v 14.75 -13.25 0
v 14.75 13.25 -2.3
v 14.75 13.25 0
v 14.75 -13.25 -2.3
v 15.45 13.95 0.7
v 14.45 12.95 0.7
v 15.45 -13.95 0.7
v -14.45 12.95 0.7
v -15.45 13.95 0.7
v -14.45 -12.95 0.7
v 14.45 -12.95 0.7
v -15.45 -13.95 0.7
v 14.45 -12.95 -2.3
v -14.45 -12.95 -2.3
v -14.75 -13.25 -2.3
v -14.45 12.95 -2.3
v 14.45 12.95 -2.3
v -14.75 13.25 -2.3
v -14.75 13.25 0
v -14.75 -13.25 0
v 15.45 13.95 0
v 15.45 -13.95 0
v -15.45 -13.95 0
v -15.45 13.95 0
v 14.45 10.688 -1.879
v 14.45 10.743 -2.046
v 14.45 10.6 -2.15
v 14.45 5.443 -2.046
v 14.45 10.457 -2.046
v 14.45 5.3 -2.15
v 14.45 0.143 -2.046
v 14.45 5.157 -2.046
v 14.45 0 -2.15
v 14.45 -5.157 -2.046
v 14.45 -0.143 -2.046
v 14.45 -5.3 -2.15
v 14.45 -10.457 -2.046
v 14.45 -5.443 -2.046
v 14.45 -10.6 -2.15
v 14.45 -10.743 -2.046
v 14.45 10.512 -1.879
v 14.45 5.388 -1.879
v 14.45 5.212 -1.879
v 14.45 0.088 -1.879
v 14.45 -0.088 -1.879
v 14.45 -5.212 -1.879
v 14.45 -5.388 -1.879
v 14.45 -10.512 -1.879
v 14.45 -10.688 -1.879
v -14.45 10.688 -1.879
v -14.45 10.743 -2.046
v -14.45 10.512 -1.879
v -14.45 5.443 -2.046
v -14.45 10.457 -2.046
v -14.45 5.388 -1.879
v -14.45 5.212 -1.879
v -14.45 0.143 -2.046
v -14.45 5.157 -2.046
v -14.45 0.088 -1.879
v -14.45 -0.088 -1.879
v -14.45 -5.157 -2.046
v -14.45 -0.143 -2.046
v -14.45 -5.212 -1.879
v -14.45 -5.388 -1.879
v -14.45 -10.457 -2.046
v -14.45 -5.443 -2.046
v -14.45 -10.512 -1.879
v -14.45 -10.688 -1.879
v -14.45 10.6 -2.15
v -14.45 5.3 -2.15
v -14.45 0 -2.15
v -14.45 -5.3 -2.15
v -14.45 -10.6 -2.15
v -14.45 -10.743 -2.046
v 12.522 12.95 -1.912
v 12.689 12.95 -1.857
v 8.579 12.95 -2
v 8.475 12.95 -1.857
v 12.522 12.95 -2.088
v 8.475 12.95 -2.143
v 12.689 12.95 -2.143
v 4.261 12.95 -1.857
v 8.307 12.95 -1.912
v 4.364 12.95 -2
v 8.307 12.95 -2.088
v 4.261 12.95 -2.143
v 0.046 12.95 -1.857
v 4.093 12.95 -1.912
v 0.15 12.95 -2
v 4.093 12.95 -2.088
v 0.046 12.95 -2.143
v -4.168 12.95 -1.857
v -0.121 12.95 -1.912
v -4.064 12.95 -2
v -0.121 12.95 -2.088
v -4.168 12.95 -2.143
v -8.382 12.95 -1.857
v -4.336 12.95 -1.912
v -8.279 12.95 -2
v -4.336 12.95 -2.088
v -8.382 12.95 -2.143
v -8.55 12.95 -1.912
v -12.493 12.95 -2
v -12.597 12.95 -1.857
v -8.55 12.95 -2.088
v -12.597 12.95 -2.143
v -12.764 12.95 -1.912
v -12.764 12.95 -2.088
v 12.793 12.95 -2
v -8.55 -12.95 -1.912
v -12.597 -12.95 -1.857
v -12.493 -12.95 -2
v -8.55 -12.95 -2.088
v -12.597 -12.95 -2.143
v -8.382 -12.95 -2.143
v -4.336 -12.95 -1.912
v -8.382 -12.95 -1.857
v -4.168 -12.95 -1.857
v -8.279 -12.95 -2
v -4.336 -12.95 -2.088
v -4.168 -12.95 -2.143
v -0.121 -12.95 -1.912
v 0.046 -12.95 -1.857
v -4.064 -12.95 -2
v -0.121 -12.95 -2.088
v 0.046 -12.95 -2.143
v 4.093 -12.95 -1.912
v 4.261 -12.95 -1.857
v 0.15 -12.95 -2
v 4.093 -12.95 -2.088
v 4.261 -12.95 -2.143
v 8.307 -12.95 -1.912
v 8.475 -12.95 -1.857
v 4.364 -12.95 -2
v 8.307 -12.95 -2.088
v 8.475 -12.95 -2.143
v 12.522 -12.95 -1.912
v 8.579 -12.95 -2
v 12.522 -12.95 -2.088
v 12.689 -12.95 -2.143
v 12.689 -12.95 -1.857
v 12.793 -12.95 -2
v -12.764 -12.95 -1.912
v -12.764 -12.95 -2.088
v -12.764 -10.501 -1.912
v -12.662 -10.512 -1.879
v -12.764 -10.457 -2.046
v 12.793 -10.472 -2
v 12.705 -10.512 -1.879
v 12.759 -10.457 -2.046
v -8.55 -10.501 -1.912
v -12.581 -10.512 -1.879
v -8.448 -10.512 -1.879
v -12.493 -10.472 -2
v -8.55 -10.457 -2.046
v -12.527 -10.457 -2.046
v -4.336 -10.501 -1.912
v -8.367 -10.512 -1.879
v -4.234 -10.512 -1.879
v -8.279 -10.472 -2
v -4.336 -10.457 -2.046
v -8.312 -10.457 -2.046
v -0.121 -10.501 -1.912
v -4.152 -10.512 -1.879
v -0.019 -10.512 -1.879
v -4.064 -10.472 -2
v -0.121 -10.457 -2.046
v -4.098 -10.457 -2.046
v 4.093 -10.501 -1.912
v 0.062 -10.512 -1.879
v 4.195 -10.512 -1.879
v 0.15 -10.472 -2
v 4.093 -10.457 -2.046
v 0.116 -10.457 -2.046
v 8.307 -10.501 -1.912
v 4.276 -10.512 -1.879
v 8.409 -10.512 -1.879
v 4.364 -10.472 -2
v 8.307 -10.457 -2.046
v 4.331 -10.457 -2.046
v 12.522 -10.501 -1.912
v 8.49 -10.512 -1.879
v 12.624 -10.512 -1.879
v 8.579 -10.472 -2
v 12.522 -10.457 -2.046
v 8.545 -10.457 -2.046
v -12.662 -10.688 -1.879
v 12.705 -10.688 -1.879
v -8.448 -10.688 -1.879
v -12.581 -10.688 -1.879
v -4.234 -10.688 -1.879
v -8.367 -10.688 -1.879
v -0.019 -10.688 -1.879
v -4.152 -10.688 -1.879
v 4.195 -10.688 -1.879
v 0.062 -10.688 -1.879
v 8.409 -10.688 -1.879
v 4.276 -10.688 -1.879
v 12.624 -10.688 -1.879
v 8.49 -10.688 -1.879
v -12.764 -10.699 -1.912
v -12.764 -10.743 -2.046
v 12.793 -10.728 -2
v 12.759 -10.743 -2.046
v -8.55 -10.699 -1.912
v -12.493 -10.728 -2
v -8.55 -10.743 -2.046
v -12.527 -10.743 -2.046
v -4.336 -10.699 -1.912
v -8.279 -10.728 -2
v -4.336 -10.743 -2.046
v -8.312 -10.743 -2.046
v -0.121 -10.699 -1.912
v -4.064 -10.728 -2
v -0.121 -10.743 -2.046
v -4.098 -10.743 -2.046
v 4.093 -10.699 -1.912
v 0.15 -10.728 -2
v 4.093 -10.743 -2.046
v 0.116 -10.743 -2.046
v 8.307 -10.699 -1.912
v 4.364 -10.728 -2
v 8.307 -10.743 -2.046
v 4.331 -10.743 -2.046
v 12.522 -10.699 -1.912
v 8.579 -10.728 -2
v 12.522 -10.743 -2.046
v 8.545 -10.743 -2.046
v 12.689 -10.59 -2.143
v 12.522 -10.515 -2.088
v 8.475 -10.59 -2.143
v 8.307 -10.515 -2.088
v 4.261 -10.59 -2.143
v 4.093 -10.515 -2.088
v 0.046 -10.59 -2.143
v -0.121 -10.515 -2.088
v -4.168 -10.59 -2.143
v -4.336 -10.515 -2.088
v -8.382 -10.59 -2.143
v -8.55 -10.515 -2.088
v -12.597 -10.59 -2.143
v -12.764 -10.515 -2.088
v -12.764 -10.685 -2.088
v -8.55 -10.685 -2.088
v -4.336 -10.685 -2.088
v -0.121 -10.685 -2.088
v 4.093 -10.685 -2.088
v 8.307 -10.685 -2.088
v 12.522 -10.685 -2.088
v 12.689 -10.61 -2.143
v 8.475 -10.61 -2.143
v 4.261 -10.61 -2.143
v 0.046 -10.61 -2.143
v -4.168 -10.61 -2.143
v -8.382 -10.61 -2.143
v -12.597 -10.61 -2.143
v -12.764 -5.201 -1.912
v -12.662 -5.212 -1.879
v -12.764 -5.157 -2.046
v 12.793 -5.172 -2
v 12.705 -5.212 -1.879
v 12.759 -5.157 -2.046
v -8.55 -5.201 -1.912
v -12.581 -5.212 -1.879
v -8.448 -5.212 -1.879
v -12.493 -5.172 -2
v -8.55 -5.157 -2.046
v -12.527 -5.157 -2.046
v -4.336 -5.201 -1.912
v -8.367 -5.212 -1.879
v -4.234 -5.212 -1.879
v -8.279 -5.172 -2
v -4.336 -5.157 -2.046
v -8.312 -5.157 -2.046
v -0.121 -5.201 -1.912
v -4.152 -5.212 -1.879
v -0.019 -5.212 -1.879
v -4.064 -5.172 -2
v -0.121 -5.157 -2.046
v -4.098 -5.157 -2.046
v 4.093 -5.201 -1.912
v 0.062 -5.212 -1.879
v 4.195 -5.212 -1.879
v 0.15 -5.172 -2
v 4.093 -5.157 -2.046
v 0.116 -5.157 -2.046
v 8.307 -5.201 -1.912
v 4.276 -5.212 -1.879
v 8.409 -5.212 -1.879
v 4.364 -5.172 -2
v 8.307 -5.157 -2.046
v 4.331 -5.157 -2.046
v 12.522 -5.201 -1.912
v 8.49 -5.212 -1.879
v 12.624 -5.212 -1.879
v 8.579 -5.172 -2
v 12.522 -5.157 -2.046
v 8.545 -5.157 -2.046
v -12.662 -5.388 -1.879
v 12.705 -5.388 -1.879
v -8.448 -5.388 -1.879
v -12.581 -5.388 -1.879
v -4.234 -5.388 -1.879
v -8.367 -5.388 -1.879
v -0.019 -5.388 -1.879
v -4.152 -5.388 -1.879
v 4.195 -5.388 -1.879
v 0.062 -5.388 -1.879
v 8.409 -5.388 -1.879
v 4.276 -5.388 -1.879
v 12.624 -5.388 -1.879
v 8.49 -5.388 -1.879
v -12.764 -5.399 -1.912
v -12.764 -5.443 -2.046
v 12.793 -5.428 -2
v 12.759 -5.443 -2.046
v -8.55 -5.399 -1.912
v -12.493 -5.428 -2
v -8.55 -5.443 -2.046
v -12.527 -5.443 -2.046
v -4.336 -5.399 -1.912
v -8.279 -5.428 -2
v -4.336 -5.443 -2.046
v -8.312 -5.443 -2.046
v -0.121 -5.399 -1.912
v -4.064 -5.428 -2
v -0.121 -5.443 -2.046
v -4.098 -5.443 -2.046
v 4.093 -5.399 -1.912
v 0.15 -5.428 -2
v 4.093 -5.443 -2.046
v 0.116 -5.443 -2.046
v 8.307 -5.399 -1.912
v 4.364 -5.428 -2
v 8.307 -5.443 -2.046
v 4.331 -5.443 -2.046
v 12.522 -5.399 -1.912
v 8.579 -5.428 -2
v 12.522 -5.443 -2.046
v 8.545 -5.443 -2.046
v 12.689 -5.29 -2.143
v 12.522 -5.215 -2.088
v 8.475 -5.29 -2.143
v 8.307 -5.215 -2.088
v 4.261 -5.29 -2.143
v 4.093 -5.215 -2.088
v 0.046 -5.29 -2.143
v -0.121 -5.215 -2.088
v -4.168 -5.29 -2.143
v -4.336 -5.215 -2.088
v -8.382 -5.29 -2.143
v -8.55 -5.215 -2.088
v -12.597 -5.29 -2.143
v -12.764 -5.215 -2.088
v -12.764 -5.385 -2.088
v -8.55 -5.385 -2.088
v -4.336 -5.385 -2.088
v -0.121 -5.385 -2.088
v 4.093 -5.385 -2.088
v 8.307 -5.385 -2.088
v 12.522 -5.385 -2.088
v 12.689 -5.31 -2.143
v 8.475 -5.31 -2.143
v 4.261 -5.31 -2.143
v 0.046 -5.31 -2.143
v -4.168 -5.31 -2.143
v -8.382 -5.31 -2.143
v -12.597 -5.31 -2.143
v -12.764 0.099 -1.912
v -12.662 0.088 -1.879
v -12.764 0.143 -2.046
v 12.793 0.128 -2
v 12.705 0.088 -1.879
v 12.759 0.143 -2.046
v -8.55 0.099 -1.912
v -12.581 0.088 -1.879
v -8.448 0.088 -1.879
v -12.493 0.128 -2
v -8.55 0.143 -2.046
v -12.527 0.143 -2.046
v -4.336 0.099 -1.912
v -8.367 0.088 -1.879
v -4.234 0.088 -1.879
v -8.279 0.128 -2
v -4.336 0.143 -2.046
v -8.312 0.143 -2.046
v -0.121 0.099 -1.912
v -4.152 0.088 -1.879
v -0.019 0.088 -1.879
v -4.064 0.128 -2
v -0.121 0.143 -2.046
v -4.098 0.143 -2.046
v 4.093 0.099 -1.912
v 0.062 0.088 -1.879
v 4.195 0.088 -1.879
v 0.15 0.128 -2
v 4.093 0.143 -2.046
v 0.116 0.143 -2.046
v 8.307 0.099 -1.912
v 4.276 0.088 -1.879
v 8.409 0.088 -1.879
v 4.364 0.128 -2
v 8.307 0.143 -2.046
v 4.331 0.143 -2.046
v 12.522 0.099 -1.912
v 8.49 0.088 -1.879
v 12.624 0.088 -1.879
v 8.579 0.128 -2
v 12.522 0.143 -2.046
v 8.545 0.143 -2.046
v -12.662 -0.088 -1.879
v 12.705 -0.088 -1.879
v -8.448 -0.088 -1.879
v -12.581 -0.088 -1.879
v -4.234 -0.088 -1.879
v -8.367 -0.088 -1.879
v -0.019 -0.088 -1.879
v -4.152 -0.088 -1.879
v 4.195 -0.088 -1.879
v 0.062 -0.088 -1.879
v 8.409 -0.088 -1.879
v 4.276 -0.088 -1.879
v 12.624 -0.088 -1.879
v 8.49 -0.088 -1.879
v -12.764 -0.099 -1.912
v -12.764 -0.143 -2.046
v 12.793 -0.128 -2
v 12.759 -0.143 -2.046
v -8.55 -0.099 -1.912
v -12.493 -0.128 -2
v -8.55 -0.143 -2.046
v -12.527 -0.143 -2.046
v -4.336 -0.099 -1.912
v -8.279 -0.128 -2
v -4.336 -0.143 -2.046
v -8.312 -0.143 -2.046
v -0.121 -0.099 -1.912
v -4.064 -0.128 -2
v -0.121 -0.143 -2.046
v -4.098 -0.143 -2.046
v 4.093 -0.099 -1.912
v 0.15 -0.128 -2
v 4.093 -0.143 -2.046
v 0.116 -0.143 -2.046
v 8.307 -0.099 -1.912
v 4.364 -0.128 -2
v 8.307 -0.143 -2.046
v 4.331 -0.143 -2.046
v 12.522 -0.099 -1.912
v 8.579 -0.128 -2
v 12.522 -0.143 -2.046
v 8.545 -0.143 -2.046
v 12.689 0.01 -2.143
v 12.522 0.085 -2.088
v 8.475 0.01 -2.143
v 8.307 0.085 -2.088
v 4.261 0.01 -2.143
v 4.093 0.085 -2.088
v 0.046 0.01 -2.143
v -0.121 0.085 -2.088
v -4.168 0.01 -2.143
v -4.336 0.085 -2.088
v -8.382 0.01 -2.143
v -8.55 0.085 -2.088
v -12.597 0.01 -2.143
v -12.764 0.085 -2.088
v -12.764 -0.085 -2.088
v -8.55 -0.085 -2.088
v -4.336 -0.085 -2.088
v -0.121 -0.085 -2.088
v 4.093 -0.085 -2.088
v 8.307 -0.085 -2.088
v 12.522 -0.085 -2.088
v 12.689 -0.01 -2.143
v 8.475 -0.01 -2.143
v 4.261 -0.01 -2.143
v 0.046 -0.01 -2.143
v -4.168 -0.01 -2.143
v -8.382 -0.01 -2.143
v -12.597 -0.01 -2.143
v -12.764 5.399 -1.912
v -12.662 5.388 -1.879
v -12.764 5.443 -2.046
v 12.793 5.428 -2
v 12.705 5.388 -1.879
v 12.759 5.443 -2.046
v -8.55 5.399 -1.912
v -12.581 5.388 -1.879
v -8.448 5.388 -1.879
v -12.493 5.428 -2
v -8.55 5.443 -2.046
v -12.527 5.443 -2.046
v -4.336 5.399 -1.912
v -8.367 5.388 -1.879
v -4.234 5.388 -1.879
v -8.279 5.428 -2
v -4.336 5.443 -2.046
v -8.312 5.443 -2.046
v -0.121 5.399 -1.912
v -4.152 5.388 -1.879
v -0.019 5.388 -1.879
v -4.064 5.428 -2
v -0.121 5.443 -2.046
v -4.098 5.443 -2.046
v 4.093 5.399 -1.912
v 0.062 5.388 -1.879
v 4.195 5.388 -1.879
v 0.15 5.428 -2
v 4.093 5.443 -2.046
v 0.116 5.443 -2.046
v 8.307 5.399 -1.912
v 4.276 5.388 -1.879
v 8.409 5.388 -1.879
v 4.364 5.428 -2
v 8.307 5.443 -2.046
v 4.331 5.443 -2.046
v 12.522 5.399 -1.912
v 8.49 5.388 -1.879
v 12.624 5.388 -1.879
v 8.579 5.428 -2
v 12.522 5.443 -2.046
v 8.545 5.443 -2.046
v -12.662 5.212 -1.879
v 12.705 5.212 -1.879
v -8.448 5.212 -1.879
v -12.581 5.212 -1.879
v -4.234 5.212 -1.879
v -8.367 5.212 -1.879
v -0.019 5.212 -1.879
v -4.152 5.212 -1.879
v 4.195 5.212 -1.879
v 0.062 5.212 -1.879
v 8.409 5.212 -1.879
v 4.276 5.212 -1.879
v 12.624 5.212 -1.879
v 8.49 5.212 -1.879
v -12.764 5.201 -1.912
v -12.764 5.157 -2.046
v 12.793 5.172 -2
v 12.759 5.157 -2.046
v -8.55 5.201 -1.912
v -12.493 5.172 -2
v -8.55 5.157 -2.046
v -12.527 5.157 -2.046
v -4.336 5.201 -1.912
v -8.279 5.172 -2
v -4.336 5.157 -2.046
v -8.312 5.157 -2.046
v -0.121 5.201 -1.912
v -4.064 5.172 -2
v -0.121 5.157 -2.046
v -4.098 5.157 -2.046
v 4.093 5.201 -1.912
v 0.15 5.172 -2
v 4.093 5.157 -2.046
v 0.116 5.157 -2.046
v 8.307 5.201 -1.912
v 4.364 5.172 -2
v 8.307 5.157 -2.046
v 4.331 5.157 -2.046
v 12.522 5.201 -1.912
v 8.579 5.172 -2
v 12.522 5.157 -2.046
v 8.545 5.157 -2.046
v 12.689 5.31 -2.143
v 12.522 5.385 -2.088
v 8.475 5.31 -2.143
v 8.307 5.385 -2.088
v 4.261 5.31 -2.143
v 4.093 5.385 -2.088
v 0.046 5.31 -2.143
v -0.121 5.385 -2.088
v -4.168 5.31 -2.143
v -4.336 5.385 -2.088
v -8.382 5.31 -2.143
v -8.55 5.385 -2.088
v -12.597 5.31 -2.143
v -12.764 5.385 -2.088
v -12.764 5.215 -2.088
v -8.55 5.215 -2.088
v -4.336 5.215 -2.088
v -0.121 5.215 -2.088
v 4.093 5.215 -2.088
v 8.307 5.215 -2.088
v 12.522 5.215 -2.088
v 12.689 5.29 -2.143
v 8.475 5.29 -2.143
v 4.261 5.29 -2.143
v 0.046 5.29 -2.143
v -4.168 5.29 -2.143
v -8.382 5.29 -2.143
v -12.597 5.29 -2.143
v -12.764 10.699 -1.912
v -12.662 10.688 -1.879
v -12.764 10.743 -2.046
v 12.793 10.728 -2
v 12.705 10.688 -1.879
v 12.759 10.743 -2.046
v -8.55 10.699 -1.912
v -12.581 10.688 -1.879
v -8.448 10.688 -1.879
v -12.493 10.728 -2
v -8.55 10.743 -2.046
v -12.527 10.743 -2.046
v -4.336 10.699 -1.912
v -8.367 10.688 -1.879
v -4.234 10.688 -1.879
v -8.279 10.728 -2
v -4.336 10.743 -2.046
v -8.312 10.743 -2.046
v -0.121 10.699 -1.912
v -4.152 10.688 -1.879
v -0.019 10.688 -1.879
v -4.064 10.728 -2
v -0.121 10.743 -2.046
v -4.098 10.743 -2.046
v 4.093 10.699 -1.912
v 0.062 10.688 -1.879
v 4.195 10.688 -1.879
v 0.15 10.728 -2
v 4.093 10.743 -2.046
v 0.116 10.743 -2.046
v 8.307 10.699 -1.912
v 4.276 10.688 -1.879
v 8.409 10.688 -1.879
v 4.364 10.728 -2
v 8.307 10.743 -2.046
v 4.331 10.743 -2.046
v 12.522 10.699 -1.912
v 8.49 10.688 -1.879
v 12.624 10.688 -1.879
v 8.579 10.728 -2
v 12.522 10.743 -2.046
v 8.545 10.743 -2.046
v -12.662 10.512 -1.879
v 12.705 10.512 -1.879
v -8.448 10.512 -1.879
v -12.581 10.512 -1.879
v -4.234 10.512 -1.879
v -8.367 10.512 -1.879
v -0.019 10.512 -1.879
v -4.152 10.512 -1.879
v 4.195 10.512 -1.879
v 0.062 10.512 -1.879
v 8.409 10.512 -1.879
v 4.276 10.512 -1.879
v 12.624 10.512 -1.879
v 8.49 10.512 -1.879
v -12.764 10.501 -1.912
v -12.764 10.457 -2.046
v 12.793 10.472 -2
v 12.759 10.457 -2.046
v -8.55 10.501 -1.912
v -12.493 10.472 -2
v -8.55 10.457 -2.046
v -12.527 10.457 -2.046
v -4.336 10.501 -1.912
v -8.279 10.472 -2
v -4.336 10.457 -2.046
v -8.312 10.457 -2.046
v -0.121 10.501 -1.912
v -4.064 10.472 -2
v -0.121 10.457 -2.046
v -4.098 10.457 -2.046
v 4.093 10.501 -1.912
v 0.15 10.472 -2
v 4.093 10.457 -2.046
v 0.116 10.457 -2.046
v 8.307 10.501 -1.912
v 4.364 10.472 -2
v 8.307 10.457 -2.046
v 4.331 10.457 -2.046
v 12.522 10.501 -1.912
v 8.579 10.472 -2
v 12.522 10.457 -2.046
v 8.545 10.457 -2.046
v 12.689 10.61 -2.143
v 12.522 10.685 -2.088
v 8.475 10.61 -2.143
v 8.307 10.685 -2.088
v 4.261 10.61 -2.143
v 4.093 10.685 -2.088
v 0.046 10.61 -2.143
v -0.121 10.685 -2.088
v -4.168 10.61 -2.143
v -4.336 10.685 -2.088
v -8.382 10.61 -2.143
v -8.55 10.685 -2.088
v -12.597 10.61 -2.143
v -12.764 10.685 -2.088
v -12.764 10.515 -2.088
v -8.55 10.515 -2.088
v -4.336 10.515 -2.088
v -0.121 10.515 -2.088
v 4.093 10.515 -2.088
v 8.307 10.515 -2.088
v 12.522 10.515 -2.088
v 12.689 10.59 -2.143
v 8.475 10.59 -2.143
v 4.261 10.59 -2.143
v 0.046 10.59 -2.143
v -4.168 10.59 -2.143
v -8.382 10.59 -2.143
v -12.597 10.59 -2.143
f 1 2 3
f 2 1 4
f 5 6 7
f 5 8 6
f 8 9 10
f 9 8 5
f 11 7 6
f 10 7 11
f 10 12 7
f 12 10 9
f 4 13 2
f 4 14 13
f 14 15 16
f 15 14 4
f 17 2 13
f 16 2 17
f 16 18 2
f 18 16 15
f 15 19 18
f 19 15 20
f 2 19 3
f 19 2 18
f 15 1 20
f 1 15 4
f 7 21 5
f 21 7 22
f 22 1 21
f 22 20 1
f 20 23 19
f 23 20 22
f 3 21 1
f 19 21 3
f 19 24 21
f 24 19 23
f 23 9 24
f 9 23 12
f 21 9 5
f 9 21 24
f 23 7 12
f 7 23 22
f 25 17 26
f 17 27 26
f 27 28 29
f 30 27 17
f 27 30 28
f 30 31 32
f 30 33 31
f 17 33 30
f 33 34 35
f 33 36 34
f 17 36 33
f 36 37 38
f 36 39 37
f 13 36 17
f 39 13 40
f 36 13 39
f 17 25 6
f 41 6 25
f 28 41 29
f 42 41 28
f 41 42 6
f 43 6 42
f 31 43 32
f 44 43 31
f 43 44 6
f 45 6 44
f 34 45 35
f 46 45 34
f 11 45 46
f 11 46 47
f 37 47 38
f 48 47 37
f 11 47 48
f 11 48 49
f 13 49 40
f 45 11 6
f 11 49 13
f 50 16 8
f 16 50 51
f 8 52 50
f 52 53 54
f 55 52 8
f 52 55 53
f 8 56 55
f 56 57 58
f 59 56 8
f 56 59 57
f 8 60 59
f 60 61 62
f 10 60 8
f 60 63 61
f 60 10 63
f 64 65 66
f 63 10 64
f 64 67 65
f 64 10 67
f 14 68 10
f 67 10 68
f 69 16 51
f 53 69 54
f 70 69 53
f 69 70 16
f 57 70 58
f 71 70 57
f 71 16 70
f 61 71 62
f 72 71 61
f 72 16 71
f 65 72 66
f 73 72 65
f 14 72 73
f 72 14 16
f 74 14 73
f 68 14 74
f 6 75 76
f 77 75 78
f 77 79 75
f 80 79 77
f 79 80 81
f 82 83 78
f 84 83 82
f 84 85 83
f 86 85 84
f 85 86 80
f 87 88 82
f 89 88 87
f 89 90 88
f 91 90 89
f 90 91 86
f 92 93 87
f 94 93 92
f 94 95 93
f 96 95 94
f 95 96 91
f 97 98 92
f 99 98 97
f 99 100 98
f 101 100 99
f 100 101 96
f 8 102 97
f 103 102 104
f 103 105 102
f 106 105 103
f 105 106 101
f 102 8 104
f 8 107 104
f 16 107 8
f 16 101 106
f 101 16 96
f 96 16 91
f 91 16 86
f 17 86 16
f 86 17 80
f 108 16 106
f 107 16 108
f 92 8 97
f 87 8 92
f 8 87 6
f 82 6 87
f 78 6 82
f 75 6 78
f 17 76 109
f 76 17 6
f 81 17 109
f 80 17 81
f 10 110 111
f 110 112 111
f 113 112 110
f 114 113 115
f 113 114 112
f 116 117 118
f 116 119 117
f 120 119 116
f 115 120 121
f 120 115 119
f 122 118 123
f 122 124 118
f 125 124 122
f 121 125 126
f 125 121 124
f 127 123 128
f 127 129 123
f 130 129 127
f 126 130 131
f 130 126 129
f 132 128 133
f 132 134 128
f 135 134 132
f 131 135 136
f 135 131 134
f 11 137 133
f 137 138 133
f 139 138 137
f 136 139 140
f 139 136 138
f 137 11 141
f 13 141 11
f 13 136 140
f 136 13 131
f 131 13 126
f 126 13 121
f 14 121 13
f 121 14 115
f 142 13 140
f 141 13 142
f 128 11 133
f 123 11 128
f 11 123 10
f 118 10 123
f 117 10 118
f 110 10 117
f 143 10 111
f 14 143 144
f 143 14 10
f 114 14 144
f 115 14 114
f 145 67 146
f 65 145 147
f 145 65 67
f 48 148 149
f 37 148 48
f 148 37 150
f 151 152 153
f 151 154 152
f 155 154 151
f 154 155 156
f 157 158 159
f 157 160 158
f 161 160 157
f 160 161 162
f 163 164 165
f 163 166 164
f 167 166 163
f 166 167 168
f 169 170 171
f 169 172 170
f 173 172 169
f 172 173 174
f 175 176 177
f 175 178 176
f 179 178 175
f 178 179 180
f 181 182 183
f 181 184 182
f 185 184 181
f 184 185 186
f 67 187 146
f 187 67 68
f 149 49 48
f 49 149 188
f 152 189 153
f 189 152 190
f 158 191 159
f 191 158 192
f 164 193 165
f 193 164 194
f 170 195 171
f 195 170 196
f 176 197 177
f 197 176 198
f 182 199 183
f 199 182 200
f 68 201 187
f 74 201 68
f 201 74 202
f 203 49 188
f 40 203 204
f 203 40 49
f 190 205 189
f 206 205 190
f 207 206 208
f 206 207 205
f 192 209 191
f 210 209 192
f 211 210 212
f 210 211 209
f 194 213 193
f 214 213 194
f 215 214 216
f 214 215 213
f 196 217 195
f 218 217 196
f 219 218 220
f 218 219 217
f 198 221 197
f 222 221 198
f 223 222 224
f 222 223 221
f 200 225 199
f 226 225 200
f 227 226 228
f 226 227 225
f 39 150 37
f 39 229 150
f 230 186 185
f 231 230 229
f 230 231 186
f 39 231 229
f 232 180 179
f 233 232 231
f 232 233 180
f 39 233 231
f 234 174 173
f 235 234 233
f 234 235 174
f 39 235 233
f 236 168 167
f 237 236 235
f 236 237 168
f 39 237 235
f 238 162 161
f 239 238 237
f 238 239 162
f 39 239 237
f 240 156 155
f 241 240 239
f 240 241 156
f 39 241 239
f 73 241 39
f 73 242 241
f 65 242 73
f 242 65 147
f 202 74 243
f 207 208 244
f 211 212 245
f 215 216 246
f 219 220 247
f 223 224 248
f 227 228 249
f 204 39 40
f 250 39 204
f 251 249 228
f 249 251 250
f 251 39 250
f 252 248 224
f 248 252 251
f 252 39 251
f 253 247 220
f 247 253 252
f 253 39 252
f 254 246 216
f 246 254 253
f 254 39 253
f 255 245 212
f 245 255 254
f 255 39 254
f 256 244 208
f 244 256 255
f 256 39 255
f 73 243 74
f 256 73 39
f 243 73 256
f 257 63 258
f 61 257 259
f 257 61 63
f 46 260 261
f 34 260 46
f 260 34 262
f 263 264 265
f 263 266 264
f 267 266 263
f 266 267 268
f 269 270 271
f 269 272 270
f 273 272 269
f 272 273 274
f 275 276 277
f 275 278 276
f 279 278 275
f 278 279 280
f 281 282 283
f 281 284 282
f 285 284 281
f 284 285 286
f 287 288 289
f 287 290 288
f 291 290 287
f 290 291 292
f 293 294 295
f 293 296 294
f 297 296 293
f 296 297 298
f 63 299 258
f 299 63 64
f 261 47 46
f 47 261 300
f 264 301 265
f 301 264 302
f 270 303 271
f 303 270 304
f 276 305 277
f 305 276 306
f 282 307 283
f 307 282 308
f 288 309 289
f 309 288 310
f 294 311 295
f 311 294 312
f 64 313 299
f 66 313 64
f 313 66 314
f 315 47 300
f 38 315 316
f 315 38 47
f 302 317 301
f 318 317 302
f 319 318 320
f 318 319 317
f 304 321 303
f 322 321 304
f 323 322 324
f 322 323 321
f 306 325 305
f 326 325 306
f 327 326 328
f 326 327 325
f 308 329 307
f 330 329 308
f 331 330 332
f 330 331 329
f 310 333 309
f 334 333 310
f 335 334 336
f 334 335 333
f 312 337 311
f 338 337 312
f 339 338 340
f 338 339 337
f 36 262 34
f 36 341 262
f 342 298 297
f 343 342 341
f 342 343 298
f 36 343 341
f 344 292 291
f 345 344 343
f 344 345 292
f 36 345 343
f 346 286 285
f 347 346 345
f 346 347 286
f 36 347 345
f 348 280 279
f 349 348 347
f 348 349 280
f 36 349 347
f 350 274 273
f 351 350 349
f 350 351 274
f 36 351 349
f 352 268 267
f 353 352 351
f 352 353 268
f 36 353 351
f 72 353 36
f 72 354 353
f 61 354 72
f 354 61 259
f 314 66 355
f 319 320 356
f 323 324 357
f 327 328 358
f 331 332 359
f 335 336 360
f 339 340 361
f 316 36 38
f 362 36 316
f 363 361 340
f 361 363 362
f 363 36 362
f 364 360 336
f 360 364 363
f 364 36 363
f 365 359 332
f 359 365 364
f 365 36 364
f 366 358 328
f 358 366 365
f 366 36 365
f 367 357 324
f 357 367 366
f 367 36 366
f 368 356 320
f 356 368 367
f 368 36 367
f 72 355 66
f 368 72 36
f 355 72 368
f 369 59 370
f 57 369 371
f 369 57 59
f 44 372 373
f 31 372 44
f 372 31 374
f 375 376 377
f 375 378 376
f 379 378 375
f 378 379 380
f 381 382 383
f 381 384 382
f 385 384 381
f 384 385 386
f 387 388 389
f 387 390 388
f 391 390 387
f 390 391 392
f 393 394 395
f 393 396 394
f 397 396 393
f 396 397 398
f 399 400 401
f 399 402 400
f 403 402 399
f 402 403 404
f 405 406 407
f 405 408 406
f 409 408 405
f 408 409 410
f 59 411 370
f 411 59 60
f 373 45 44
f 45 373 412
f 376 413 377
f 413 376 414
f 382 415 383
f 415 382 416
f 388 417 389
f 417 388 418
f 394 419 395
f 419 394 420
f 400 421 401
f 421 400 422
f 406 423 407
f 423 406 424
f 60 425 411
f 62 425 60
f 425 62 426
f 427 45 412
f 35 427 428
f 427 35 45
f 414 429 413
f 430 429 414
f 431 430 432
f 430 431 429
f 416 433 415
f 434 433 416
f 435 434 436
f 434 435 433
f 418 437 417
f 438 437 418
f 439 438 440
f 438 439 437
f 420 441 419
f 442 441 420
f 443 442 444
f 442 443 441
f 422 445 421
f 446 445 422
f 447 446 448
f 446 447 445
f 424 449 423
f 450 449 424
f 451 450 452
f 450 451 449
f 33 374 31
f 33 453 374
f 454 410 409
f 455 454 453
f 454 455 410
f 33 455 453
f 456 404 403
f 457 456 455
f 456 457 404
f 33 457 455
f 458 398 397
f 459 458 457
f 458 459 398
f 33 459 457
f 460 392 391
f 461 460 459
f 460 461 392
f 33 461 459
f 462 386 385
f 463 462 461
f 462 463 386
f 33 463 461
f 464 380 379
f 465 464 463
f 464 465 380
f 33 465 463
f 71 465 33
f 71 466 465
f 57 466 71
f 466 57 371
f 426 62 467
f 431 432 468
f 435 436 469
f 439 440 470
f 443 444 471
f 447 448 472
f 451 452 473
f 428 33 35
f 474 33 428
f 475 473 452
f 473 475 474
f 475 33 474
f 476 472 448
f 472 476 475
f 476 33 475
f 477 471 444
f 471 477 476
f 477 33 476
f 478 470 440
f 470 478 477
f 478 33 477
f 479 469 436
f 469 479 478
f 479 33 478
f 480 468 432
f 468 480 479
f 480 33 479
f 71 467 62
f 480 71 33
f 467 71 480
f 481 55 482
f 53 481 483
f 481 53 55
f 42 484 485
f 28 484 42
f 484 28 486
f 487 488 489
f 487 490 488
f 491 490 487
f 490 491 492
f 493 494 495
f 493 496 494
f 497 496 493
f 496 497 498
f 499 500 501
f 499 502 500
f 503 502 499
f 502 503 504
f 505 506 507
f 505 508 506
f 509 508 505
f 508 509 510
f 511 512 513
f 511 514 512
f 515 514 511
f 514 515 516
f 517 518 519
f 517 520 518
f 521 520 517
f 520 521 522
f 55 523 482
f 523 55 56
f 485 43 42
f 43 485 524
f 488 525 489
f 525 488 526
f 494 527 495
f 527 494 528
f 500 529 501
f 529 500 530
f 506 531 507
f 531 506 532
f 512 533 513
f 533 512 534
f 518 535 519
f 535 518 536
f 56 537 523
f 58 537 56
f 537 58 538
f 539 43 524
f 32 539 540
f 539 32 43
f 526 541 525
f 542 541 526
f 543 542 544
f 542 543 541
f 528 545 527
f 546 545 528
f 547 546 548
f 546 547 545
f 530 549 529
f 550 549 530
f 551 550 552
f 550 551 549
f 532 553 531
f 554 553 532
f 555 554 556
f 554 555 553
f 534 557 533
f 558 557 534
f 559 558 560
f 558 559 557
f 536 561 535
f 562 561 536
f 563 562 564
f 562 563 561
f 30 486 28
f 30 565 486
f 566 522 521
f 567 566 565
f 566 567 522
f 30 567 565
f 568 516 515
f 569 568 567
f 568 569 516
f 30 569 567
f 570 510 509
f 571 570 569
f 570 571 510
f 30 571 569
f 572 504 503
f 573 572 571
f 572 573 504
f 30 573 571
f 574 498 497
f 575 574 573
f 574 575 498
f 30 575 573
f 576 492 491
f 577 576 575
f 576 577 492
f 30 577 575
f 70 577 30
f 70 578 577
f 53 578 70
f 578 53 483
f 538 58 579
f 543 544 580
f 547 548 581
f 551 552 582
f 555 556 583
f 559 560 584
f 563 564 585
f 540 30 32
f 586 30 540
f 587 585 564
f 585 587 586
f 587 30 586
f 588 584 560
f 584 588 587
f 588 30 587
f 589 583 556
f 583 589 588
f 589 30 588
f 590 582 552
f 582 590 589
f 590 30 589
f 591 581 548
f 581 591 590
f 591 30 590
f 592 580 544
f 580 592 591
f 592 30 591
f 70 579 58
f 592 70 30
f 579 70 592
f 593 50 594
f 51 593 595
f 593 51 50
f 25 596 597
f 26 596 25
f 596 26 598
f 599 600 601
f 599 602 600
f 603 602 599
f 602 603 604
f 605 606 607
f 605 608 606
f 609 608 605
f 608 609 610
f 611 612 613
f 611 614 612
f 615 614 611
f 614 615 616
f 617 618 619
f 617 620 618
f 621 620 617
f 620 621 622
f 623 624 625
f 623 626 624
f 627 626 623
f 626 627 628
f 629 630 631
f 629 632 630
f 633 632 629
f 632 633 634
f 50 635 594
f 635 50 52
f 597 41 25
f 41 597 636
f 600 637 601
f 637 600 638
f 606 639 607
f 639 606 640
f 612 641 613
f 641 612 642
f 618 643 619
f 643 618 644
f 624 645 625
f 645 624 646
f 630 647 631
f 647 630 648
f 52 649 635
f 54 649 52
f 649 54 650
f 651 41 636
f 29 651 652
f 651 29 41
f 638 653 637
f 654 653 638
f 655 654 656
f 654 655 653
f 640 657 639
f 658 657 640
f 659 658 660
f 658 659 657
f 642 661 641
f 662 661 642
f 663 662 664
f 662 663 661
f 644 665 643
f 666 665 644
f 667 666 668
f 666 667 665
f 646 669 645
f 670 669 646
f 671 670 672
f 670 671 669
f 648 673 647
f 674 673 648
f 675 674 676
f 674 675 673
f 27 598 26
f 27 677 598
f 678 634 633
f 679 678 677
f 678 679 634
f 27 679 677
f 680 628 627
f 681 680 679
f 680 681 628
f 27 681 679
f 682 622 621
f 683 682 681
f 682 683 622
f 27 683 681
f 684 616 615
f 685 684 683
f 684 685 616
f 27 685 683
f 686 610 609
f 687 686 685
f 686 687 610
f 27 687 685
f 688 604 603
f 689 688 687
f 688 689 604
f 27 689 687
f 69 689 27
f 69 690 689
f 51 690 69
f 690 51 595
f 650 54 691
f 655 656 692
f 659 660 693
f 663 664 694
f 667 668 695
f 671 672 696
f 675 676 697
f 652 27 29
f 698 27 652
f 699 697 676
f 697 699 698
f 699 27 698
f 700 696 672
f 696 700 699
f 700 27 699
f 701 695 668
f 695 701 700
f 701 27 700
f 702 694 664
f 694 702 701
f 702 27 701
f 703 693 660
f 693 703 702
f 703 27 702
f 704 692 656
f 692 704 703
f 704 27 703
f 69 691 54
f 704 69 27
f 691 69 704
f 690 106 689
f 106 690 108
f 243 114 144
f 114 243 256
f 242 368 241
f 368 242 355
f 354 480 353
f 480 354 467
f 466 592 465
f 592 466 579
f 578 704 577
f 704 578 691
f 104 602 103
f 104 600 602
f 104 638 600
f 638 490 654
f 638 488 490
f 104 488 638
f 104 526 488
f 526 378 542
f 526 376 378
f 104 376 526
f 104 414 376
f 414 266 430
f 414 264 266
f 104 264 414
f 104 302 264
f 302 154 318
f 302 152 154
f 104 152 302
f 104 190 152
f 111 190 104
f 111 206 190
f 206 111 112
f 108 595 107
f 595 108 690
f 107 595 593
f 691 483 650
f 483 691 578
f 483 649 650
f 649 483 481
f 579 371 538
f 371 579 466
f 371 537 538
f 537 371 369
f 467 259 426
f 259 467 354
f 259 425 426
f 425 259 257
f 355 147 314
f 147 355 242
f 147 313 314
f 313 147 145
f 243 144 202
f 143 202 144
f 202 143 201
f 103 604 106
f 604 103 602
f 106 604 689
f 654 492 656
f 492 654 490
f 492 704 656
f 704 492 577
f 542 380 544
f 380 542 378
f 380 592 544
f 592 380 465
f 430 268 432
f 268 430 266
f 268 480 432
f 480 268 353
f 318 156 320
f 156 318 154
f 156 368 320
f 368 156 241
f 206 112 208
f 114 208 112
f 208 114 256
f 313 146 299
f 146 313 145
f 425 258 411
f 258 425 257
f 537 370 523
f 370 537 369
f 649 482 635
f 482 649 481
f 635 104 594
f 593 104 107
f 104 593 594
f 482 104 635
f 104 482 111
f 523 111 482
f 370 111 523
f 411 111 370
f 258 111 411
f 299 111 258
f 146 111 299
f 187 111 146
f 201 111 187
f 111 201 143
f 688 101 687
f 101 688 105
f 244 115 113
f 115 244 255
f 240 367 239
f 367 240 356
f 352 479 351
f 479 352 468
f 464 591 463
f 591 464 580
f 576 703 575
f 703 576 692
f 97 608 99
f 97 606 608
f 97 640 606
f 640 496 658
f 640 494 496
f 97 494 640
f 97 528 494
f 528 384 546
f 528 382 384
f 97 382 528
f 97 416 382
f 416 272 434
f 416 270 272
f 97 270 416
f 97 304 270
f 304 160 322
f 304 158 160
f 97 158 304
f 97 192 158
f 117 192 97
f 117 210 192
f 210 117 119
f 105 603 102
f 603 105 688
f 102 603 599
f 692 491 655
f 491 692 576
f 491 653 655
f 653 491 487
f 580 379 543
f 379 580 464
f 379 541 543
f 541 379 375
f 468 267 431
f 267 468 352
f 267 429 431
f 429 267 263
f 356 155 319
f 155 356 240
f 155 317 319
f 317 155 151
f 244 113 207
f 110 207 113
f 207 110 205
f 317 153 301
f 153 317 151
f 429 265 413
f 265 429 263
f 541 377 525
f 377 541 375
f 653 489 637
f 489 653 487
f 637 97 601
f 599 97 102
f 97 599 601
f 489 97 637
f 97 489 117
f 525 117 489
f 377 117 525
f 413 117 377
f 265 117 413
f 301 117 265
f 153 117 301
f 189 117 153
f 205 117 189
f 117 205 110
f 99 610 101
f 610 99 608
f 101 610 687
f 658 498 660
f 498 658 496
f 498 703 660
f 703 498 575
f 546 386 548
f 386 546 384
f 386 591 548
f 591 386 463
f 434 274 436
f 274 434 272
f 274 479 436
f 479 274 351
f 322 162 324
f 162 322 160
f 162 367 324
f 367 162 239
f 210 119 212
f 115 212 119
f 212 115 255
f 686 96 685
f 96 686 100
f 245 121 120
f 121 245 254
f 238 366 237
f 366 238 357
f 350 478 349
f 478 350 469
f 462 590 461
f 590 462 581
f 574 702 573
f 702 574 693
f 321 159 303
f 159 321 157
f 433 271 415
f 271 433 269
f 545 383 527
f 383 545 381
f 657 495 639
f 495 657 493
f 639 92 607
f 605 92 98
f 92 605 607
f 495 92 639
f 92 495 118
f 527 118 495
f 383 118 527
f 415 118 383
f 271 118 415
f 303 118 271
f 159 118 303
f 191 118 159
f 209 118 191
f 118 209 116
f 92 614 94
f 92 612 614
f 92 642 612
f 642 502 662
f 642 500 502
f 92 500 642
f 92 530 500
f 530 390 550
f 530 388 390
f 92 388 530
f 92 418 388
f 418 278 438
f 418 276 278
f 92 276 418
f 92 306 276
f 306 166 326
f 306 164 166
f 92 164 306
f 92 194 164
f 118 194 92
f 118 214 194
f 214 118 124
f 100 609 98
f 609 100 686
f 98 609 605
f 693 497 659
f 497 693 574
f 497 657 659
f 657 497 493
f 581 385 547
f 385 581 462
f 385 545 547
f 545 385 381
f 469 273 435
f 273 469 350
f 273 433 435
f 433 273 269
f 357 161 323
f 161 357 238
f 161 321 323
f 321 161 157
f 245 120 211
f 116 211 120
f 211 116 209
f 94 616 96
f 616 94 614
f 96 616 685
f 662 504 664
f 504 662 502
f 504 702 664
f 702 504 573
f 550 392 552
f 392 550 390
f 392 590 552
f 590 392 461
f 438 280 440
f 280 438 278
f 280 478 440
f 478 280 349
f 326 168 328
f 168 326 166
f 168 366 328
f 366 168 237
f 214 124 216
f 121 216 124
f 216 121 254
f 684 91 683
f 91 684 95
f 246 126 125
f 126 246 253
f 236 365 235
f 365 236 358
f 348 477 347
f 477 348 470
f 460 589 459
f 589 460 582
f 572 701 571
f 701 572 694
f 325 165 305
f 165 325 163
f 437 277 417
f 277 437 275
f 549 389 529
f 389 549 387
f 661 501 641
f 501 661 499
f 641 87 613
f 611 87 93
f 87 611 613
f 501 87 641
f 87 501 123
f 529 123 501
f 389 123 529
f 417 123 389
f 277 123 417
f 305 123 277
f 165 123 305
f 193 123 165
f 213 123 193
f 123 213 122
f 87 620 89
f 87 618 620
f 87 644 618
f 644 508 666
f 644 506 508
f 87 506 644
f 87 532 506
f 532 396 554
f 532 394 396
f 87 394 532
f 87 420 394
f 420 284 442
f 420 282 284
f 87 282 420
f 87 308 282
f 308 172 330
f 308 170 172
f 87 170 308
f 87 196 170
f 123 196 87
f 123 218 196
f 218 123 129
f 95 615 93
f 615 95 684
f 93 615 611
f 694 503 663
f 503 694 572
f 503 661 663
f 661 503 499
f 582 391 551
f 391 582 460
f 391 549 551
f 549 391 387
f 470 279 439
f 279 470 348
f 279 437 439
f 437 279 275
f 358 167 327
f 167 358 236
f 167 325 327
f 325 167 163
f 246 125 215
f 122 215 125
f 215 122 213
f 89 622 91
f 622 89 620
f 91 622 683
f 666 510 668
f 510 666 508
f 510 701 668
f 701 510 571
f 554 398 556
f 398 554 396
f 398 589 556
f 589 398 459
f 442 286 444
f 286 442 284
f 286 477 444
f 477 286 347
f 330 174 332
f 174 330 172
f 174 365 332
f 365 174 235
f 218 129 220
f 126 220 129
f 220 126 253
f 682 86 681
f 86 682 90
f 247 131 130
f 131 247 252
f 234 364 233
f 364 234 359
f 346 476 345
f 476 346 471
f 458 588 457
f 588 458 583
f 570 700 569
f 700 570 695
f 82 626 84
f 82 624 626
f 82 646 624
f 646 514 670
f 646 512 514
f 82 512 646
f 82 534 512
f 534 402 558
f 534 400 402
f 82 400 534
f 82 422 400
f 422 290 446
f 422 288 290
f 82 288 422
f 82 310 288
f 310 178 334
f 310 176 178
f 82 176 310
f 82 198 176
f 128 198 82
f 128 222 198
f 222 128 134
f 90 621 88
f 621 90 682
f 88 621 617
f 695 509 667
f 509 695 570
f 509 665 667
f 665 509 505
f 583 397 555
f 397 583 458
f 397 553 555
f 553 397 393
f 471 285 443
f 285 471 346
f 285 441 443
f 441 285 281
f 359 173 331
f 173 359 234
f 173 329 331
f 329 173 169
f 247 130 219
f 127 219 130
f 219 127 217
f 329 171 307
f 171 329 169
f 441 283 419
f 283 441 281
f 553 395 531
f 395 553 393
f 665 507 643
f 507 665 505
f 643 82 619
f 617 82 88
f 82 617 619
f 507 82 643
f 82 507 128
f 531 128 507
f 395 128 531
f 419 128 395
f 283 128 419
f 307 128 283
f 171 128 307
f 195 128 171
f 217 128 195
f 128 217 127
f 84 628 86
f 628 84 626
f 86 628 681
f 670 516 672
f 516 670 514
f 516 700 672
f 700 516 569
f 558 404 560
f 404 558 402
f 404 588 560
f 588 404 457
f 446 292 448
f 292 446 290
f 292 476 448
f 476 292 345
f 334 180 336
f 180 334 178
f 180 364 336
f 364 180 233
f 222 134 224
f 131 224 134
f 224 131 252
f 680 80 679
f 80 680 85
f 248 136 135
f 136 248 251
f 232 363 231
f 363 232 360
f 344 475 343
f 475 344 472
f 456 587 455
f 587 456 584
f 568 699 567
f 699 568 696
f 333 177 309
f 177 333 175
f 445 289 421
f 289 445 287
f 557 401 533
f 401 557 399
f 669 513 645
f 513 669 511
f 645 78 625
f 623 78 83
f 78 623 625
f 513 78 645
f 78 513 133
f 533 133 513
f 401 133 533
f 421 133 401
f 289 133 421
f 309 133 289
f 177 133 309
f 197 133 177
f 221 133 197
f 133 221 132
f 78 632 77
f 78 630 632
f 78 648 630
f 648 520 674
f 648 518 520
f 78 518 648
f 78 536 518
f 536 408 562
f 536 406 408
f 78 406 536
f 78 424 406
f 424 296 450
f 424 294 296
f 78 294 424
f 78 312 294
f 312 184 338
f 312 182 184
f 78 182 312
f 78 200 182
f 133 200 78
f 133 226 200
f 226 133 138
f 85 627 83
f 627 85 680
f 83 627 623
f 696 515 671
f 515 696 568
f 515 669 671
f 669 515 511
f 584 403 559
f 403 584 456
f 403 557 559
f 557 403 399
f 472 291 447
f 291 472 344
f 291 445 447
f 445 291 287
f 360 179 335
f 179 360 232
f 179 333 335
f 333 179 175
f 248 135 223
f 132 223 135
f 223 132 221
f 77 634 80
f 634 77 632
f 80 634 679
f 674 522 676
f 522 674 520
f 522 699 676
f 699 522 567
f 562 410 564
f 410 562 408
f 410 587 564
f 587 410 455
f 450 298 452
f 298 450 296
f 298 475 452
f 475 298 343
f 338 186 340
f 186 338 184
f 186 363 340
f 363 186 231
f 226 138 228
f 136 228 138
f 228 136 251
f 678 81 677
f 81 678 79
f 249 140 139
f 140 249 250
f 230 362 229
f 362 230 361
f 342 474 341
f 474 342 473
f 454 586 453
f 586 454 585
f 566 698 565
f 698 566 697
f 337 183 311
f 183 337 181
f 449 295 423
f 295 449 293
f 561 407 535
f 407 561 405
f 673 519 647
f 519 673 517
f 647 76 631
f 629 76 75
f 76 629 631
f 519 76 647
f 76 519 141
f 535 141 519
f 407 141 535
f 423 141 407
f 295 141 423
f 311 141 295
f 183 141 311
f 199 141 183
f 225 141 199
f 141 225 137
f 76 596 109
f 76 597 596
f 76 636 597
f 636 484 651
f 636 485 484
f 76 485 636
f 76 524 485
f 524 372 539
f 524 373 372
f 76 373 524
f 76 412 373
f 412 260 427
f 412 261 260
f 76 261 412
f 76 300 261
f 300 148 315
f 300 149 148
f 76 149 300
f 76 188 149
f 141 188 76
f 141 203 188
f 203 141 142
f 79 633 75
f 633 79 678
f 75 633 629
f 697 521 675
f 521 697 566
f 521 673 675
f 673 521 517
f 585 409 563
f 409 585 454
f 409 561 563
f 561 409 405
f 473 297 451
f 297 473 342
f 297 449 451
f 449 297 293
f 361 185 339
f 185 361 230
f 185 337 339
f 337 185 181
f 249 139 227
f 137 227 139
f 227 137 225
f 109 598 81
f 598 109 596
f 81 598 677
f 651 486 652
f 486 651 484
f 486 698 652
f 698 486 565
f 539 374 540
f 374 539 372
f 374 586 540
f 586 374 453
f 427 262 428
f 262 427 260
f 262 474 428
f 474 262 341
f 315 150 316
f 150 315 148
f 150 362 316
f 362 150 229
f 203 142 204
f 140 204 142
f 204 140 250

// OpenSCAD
rack_width = 29.5;
rack_depth = 26.5;
rack_height = 3;
rack_wall_t = 0.3;
wire_w = 0.3;
shoulder_w = 0.7;
shoulder_h = 0.7;

module drying_rack()
{
    color("silver")
    translate([0,0,-rack_height/2+shoulder_h]) 
    {
        difference() 
        {
            union() {
                cube ([rack_width, 
                    rack_depth, rack_height], 
                    center = true);
                
                translate([0,0,rack_height/2-shoulder_h/2])
                cube ([rack_width + 2 * shoulder_w, 
                    rack_depth + 2 * shoulder_w,
                    shoulder_h], 
                    center = true);
            }
            
            cube ([rack_width-2*rack_wall_t, 
                rack_depth - 2*rack_wall_t, 
                rack_height+0.2], 
                center = true);
        }
        
        n = 5;
        step = rack_depth/n;
        for (i = [-(n-1)/2:(n-1)/2])
        {
            translate([0, i*step, -rack_height/2+wire_w])
            rotate([0,90,0])
            cylinder(h = rack_width, 
                d = wire_w, center = true);
        }

        n2 = 7;
        step2 = rack_width/n2;
        for (j = [-(n2-1)/2:(n2-1)/2])
        {
            translate([j*step2, 0, -rack_height/2+wire_w])
            rotate([90,0,0])
            cylinder(h = rack_depth, 
                d = wire_w, center = true);
        }
    }
}

drying_rack();
